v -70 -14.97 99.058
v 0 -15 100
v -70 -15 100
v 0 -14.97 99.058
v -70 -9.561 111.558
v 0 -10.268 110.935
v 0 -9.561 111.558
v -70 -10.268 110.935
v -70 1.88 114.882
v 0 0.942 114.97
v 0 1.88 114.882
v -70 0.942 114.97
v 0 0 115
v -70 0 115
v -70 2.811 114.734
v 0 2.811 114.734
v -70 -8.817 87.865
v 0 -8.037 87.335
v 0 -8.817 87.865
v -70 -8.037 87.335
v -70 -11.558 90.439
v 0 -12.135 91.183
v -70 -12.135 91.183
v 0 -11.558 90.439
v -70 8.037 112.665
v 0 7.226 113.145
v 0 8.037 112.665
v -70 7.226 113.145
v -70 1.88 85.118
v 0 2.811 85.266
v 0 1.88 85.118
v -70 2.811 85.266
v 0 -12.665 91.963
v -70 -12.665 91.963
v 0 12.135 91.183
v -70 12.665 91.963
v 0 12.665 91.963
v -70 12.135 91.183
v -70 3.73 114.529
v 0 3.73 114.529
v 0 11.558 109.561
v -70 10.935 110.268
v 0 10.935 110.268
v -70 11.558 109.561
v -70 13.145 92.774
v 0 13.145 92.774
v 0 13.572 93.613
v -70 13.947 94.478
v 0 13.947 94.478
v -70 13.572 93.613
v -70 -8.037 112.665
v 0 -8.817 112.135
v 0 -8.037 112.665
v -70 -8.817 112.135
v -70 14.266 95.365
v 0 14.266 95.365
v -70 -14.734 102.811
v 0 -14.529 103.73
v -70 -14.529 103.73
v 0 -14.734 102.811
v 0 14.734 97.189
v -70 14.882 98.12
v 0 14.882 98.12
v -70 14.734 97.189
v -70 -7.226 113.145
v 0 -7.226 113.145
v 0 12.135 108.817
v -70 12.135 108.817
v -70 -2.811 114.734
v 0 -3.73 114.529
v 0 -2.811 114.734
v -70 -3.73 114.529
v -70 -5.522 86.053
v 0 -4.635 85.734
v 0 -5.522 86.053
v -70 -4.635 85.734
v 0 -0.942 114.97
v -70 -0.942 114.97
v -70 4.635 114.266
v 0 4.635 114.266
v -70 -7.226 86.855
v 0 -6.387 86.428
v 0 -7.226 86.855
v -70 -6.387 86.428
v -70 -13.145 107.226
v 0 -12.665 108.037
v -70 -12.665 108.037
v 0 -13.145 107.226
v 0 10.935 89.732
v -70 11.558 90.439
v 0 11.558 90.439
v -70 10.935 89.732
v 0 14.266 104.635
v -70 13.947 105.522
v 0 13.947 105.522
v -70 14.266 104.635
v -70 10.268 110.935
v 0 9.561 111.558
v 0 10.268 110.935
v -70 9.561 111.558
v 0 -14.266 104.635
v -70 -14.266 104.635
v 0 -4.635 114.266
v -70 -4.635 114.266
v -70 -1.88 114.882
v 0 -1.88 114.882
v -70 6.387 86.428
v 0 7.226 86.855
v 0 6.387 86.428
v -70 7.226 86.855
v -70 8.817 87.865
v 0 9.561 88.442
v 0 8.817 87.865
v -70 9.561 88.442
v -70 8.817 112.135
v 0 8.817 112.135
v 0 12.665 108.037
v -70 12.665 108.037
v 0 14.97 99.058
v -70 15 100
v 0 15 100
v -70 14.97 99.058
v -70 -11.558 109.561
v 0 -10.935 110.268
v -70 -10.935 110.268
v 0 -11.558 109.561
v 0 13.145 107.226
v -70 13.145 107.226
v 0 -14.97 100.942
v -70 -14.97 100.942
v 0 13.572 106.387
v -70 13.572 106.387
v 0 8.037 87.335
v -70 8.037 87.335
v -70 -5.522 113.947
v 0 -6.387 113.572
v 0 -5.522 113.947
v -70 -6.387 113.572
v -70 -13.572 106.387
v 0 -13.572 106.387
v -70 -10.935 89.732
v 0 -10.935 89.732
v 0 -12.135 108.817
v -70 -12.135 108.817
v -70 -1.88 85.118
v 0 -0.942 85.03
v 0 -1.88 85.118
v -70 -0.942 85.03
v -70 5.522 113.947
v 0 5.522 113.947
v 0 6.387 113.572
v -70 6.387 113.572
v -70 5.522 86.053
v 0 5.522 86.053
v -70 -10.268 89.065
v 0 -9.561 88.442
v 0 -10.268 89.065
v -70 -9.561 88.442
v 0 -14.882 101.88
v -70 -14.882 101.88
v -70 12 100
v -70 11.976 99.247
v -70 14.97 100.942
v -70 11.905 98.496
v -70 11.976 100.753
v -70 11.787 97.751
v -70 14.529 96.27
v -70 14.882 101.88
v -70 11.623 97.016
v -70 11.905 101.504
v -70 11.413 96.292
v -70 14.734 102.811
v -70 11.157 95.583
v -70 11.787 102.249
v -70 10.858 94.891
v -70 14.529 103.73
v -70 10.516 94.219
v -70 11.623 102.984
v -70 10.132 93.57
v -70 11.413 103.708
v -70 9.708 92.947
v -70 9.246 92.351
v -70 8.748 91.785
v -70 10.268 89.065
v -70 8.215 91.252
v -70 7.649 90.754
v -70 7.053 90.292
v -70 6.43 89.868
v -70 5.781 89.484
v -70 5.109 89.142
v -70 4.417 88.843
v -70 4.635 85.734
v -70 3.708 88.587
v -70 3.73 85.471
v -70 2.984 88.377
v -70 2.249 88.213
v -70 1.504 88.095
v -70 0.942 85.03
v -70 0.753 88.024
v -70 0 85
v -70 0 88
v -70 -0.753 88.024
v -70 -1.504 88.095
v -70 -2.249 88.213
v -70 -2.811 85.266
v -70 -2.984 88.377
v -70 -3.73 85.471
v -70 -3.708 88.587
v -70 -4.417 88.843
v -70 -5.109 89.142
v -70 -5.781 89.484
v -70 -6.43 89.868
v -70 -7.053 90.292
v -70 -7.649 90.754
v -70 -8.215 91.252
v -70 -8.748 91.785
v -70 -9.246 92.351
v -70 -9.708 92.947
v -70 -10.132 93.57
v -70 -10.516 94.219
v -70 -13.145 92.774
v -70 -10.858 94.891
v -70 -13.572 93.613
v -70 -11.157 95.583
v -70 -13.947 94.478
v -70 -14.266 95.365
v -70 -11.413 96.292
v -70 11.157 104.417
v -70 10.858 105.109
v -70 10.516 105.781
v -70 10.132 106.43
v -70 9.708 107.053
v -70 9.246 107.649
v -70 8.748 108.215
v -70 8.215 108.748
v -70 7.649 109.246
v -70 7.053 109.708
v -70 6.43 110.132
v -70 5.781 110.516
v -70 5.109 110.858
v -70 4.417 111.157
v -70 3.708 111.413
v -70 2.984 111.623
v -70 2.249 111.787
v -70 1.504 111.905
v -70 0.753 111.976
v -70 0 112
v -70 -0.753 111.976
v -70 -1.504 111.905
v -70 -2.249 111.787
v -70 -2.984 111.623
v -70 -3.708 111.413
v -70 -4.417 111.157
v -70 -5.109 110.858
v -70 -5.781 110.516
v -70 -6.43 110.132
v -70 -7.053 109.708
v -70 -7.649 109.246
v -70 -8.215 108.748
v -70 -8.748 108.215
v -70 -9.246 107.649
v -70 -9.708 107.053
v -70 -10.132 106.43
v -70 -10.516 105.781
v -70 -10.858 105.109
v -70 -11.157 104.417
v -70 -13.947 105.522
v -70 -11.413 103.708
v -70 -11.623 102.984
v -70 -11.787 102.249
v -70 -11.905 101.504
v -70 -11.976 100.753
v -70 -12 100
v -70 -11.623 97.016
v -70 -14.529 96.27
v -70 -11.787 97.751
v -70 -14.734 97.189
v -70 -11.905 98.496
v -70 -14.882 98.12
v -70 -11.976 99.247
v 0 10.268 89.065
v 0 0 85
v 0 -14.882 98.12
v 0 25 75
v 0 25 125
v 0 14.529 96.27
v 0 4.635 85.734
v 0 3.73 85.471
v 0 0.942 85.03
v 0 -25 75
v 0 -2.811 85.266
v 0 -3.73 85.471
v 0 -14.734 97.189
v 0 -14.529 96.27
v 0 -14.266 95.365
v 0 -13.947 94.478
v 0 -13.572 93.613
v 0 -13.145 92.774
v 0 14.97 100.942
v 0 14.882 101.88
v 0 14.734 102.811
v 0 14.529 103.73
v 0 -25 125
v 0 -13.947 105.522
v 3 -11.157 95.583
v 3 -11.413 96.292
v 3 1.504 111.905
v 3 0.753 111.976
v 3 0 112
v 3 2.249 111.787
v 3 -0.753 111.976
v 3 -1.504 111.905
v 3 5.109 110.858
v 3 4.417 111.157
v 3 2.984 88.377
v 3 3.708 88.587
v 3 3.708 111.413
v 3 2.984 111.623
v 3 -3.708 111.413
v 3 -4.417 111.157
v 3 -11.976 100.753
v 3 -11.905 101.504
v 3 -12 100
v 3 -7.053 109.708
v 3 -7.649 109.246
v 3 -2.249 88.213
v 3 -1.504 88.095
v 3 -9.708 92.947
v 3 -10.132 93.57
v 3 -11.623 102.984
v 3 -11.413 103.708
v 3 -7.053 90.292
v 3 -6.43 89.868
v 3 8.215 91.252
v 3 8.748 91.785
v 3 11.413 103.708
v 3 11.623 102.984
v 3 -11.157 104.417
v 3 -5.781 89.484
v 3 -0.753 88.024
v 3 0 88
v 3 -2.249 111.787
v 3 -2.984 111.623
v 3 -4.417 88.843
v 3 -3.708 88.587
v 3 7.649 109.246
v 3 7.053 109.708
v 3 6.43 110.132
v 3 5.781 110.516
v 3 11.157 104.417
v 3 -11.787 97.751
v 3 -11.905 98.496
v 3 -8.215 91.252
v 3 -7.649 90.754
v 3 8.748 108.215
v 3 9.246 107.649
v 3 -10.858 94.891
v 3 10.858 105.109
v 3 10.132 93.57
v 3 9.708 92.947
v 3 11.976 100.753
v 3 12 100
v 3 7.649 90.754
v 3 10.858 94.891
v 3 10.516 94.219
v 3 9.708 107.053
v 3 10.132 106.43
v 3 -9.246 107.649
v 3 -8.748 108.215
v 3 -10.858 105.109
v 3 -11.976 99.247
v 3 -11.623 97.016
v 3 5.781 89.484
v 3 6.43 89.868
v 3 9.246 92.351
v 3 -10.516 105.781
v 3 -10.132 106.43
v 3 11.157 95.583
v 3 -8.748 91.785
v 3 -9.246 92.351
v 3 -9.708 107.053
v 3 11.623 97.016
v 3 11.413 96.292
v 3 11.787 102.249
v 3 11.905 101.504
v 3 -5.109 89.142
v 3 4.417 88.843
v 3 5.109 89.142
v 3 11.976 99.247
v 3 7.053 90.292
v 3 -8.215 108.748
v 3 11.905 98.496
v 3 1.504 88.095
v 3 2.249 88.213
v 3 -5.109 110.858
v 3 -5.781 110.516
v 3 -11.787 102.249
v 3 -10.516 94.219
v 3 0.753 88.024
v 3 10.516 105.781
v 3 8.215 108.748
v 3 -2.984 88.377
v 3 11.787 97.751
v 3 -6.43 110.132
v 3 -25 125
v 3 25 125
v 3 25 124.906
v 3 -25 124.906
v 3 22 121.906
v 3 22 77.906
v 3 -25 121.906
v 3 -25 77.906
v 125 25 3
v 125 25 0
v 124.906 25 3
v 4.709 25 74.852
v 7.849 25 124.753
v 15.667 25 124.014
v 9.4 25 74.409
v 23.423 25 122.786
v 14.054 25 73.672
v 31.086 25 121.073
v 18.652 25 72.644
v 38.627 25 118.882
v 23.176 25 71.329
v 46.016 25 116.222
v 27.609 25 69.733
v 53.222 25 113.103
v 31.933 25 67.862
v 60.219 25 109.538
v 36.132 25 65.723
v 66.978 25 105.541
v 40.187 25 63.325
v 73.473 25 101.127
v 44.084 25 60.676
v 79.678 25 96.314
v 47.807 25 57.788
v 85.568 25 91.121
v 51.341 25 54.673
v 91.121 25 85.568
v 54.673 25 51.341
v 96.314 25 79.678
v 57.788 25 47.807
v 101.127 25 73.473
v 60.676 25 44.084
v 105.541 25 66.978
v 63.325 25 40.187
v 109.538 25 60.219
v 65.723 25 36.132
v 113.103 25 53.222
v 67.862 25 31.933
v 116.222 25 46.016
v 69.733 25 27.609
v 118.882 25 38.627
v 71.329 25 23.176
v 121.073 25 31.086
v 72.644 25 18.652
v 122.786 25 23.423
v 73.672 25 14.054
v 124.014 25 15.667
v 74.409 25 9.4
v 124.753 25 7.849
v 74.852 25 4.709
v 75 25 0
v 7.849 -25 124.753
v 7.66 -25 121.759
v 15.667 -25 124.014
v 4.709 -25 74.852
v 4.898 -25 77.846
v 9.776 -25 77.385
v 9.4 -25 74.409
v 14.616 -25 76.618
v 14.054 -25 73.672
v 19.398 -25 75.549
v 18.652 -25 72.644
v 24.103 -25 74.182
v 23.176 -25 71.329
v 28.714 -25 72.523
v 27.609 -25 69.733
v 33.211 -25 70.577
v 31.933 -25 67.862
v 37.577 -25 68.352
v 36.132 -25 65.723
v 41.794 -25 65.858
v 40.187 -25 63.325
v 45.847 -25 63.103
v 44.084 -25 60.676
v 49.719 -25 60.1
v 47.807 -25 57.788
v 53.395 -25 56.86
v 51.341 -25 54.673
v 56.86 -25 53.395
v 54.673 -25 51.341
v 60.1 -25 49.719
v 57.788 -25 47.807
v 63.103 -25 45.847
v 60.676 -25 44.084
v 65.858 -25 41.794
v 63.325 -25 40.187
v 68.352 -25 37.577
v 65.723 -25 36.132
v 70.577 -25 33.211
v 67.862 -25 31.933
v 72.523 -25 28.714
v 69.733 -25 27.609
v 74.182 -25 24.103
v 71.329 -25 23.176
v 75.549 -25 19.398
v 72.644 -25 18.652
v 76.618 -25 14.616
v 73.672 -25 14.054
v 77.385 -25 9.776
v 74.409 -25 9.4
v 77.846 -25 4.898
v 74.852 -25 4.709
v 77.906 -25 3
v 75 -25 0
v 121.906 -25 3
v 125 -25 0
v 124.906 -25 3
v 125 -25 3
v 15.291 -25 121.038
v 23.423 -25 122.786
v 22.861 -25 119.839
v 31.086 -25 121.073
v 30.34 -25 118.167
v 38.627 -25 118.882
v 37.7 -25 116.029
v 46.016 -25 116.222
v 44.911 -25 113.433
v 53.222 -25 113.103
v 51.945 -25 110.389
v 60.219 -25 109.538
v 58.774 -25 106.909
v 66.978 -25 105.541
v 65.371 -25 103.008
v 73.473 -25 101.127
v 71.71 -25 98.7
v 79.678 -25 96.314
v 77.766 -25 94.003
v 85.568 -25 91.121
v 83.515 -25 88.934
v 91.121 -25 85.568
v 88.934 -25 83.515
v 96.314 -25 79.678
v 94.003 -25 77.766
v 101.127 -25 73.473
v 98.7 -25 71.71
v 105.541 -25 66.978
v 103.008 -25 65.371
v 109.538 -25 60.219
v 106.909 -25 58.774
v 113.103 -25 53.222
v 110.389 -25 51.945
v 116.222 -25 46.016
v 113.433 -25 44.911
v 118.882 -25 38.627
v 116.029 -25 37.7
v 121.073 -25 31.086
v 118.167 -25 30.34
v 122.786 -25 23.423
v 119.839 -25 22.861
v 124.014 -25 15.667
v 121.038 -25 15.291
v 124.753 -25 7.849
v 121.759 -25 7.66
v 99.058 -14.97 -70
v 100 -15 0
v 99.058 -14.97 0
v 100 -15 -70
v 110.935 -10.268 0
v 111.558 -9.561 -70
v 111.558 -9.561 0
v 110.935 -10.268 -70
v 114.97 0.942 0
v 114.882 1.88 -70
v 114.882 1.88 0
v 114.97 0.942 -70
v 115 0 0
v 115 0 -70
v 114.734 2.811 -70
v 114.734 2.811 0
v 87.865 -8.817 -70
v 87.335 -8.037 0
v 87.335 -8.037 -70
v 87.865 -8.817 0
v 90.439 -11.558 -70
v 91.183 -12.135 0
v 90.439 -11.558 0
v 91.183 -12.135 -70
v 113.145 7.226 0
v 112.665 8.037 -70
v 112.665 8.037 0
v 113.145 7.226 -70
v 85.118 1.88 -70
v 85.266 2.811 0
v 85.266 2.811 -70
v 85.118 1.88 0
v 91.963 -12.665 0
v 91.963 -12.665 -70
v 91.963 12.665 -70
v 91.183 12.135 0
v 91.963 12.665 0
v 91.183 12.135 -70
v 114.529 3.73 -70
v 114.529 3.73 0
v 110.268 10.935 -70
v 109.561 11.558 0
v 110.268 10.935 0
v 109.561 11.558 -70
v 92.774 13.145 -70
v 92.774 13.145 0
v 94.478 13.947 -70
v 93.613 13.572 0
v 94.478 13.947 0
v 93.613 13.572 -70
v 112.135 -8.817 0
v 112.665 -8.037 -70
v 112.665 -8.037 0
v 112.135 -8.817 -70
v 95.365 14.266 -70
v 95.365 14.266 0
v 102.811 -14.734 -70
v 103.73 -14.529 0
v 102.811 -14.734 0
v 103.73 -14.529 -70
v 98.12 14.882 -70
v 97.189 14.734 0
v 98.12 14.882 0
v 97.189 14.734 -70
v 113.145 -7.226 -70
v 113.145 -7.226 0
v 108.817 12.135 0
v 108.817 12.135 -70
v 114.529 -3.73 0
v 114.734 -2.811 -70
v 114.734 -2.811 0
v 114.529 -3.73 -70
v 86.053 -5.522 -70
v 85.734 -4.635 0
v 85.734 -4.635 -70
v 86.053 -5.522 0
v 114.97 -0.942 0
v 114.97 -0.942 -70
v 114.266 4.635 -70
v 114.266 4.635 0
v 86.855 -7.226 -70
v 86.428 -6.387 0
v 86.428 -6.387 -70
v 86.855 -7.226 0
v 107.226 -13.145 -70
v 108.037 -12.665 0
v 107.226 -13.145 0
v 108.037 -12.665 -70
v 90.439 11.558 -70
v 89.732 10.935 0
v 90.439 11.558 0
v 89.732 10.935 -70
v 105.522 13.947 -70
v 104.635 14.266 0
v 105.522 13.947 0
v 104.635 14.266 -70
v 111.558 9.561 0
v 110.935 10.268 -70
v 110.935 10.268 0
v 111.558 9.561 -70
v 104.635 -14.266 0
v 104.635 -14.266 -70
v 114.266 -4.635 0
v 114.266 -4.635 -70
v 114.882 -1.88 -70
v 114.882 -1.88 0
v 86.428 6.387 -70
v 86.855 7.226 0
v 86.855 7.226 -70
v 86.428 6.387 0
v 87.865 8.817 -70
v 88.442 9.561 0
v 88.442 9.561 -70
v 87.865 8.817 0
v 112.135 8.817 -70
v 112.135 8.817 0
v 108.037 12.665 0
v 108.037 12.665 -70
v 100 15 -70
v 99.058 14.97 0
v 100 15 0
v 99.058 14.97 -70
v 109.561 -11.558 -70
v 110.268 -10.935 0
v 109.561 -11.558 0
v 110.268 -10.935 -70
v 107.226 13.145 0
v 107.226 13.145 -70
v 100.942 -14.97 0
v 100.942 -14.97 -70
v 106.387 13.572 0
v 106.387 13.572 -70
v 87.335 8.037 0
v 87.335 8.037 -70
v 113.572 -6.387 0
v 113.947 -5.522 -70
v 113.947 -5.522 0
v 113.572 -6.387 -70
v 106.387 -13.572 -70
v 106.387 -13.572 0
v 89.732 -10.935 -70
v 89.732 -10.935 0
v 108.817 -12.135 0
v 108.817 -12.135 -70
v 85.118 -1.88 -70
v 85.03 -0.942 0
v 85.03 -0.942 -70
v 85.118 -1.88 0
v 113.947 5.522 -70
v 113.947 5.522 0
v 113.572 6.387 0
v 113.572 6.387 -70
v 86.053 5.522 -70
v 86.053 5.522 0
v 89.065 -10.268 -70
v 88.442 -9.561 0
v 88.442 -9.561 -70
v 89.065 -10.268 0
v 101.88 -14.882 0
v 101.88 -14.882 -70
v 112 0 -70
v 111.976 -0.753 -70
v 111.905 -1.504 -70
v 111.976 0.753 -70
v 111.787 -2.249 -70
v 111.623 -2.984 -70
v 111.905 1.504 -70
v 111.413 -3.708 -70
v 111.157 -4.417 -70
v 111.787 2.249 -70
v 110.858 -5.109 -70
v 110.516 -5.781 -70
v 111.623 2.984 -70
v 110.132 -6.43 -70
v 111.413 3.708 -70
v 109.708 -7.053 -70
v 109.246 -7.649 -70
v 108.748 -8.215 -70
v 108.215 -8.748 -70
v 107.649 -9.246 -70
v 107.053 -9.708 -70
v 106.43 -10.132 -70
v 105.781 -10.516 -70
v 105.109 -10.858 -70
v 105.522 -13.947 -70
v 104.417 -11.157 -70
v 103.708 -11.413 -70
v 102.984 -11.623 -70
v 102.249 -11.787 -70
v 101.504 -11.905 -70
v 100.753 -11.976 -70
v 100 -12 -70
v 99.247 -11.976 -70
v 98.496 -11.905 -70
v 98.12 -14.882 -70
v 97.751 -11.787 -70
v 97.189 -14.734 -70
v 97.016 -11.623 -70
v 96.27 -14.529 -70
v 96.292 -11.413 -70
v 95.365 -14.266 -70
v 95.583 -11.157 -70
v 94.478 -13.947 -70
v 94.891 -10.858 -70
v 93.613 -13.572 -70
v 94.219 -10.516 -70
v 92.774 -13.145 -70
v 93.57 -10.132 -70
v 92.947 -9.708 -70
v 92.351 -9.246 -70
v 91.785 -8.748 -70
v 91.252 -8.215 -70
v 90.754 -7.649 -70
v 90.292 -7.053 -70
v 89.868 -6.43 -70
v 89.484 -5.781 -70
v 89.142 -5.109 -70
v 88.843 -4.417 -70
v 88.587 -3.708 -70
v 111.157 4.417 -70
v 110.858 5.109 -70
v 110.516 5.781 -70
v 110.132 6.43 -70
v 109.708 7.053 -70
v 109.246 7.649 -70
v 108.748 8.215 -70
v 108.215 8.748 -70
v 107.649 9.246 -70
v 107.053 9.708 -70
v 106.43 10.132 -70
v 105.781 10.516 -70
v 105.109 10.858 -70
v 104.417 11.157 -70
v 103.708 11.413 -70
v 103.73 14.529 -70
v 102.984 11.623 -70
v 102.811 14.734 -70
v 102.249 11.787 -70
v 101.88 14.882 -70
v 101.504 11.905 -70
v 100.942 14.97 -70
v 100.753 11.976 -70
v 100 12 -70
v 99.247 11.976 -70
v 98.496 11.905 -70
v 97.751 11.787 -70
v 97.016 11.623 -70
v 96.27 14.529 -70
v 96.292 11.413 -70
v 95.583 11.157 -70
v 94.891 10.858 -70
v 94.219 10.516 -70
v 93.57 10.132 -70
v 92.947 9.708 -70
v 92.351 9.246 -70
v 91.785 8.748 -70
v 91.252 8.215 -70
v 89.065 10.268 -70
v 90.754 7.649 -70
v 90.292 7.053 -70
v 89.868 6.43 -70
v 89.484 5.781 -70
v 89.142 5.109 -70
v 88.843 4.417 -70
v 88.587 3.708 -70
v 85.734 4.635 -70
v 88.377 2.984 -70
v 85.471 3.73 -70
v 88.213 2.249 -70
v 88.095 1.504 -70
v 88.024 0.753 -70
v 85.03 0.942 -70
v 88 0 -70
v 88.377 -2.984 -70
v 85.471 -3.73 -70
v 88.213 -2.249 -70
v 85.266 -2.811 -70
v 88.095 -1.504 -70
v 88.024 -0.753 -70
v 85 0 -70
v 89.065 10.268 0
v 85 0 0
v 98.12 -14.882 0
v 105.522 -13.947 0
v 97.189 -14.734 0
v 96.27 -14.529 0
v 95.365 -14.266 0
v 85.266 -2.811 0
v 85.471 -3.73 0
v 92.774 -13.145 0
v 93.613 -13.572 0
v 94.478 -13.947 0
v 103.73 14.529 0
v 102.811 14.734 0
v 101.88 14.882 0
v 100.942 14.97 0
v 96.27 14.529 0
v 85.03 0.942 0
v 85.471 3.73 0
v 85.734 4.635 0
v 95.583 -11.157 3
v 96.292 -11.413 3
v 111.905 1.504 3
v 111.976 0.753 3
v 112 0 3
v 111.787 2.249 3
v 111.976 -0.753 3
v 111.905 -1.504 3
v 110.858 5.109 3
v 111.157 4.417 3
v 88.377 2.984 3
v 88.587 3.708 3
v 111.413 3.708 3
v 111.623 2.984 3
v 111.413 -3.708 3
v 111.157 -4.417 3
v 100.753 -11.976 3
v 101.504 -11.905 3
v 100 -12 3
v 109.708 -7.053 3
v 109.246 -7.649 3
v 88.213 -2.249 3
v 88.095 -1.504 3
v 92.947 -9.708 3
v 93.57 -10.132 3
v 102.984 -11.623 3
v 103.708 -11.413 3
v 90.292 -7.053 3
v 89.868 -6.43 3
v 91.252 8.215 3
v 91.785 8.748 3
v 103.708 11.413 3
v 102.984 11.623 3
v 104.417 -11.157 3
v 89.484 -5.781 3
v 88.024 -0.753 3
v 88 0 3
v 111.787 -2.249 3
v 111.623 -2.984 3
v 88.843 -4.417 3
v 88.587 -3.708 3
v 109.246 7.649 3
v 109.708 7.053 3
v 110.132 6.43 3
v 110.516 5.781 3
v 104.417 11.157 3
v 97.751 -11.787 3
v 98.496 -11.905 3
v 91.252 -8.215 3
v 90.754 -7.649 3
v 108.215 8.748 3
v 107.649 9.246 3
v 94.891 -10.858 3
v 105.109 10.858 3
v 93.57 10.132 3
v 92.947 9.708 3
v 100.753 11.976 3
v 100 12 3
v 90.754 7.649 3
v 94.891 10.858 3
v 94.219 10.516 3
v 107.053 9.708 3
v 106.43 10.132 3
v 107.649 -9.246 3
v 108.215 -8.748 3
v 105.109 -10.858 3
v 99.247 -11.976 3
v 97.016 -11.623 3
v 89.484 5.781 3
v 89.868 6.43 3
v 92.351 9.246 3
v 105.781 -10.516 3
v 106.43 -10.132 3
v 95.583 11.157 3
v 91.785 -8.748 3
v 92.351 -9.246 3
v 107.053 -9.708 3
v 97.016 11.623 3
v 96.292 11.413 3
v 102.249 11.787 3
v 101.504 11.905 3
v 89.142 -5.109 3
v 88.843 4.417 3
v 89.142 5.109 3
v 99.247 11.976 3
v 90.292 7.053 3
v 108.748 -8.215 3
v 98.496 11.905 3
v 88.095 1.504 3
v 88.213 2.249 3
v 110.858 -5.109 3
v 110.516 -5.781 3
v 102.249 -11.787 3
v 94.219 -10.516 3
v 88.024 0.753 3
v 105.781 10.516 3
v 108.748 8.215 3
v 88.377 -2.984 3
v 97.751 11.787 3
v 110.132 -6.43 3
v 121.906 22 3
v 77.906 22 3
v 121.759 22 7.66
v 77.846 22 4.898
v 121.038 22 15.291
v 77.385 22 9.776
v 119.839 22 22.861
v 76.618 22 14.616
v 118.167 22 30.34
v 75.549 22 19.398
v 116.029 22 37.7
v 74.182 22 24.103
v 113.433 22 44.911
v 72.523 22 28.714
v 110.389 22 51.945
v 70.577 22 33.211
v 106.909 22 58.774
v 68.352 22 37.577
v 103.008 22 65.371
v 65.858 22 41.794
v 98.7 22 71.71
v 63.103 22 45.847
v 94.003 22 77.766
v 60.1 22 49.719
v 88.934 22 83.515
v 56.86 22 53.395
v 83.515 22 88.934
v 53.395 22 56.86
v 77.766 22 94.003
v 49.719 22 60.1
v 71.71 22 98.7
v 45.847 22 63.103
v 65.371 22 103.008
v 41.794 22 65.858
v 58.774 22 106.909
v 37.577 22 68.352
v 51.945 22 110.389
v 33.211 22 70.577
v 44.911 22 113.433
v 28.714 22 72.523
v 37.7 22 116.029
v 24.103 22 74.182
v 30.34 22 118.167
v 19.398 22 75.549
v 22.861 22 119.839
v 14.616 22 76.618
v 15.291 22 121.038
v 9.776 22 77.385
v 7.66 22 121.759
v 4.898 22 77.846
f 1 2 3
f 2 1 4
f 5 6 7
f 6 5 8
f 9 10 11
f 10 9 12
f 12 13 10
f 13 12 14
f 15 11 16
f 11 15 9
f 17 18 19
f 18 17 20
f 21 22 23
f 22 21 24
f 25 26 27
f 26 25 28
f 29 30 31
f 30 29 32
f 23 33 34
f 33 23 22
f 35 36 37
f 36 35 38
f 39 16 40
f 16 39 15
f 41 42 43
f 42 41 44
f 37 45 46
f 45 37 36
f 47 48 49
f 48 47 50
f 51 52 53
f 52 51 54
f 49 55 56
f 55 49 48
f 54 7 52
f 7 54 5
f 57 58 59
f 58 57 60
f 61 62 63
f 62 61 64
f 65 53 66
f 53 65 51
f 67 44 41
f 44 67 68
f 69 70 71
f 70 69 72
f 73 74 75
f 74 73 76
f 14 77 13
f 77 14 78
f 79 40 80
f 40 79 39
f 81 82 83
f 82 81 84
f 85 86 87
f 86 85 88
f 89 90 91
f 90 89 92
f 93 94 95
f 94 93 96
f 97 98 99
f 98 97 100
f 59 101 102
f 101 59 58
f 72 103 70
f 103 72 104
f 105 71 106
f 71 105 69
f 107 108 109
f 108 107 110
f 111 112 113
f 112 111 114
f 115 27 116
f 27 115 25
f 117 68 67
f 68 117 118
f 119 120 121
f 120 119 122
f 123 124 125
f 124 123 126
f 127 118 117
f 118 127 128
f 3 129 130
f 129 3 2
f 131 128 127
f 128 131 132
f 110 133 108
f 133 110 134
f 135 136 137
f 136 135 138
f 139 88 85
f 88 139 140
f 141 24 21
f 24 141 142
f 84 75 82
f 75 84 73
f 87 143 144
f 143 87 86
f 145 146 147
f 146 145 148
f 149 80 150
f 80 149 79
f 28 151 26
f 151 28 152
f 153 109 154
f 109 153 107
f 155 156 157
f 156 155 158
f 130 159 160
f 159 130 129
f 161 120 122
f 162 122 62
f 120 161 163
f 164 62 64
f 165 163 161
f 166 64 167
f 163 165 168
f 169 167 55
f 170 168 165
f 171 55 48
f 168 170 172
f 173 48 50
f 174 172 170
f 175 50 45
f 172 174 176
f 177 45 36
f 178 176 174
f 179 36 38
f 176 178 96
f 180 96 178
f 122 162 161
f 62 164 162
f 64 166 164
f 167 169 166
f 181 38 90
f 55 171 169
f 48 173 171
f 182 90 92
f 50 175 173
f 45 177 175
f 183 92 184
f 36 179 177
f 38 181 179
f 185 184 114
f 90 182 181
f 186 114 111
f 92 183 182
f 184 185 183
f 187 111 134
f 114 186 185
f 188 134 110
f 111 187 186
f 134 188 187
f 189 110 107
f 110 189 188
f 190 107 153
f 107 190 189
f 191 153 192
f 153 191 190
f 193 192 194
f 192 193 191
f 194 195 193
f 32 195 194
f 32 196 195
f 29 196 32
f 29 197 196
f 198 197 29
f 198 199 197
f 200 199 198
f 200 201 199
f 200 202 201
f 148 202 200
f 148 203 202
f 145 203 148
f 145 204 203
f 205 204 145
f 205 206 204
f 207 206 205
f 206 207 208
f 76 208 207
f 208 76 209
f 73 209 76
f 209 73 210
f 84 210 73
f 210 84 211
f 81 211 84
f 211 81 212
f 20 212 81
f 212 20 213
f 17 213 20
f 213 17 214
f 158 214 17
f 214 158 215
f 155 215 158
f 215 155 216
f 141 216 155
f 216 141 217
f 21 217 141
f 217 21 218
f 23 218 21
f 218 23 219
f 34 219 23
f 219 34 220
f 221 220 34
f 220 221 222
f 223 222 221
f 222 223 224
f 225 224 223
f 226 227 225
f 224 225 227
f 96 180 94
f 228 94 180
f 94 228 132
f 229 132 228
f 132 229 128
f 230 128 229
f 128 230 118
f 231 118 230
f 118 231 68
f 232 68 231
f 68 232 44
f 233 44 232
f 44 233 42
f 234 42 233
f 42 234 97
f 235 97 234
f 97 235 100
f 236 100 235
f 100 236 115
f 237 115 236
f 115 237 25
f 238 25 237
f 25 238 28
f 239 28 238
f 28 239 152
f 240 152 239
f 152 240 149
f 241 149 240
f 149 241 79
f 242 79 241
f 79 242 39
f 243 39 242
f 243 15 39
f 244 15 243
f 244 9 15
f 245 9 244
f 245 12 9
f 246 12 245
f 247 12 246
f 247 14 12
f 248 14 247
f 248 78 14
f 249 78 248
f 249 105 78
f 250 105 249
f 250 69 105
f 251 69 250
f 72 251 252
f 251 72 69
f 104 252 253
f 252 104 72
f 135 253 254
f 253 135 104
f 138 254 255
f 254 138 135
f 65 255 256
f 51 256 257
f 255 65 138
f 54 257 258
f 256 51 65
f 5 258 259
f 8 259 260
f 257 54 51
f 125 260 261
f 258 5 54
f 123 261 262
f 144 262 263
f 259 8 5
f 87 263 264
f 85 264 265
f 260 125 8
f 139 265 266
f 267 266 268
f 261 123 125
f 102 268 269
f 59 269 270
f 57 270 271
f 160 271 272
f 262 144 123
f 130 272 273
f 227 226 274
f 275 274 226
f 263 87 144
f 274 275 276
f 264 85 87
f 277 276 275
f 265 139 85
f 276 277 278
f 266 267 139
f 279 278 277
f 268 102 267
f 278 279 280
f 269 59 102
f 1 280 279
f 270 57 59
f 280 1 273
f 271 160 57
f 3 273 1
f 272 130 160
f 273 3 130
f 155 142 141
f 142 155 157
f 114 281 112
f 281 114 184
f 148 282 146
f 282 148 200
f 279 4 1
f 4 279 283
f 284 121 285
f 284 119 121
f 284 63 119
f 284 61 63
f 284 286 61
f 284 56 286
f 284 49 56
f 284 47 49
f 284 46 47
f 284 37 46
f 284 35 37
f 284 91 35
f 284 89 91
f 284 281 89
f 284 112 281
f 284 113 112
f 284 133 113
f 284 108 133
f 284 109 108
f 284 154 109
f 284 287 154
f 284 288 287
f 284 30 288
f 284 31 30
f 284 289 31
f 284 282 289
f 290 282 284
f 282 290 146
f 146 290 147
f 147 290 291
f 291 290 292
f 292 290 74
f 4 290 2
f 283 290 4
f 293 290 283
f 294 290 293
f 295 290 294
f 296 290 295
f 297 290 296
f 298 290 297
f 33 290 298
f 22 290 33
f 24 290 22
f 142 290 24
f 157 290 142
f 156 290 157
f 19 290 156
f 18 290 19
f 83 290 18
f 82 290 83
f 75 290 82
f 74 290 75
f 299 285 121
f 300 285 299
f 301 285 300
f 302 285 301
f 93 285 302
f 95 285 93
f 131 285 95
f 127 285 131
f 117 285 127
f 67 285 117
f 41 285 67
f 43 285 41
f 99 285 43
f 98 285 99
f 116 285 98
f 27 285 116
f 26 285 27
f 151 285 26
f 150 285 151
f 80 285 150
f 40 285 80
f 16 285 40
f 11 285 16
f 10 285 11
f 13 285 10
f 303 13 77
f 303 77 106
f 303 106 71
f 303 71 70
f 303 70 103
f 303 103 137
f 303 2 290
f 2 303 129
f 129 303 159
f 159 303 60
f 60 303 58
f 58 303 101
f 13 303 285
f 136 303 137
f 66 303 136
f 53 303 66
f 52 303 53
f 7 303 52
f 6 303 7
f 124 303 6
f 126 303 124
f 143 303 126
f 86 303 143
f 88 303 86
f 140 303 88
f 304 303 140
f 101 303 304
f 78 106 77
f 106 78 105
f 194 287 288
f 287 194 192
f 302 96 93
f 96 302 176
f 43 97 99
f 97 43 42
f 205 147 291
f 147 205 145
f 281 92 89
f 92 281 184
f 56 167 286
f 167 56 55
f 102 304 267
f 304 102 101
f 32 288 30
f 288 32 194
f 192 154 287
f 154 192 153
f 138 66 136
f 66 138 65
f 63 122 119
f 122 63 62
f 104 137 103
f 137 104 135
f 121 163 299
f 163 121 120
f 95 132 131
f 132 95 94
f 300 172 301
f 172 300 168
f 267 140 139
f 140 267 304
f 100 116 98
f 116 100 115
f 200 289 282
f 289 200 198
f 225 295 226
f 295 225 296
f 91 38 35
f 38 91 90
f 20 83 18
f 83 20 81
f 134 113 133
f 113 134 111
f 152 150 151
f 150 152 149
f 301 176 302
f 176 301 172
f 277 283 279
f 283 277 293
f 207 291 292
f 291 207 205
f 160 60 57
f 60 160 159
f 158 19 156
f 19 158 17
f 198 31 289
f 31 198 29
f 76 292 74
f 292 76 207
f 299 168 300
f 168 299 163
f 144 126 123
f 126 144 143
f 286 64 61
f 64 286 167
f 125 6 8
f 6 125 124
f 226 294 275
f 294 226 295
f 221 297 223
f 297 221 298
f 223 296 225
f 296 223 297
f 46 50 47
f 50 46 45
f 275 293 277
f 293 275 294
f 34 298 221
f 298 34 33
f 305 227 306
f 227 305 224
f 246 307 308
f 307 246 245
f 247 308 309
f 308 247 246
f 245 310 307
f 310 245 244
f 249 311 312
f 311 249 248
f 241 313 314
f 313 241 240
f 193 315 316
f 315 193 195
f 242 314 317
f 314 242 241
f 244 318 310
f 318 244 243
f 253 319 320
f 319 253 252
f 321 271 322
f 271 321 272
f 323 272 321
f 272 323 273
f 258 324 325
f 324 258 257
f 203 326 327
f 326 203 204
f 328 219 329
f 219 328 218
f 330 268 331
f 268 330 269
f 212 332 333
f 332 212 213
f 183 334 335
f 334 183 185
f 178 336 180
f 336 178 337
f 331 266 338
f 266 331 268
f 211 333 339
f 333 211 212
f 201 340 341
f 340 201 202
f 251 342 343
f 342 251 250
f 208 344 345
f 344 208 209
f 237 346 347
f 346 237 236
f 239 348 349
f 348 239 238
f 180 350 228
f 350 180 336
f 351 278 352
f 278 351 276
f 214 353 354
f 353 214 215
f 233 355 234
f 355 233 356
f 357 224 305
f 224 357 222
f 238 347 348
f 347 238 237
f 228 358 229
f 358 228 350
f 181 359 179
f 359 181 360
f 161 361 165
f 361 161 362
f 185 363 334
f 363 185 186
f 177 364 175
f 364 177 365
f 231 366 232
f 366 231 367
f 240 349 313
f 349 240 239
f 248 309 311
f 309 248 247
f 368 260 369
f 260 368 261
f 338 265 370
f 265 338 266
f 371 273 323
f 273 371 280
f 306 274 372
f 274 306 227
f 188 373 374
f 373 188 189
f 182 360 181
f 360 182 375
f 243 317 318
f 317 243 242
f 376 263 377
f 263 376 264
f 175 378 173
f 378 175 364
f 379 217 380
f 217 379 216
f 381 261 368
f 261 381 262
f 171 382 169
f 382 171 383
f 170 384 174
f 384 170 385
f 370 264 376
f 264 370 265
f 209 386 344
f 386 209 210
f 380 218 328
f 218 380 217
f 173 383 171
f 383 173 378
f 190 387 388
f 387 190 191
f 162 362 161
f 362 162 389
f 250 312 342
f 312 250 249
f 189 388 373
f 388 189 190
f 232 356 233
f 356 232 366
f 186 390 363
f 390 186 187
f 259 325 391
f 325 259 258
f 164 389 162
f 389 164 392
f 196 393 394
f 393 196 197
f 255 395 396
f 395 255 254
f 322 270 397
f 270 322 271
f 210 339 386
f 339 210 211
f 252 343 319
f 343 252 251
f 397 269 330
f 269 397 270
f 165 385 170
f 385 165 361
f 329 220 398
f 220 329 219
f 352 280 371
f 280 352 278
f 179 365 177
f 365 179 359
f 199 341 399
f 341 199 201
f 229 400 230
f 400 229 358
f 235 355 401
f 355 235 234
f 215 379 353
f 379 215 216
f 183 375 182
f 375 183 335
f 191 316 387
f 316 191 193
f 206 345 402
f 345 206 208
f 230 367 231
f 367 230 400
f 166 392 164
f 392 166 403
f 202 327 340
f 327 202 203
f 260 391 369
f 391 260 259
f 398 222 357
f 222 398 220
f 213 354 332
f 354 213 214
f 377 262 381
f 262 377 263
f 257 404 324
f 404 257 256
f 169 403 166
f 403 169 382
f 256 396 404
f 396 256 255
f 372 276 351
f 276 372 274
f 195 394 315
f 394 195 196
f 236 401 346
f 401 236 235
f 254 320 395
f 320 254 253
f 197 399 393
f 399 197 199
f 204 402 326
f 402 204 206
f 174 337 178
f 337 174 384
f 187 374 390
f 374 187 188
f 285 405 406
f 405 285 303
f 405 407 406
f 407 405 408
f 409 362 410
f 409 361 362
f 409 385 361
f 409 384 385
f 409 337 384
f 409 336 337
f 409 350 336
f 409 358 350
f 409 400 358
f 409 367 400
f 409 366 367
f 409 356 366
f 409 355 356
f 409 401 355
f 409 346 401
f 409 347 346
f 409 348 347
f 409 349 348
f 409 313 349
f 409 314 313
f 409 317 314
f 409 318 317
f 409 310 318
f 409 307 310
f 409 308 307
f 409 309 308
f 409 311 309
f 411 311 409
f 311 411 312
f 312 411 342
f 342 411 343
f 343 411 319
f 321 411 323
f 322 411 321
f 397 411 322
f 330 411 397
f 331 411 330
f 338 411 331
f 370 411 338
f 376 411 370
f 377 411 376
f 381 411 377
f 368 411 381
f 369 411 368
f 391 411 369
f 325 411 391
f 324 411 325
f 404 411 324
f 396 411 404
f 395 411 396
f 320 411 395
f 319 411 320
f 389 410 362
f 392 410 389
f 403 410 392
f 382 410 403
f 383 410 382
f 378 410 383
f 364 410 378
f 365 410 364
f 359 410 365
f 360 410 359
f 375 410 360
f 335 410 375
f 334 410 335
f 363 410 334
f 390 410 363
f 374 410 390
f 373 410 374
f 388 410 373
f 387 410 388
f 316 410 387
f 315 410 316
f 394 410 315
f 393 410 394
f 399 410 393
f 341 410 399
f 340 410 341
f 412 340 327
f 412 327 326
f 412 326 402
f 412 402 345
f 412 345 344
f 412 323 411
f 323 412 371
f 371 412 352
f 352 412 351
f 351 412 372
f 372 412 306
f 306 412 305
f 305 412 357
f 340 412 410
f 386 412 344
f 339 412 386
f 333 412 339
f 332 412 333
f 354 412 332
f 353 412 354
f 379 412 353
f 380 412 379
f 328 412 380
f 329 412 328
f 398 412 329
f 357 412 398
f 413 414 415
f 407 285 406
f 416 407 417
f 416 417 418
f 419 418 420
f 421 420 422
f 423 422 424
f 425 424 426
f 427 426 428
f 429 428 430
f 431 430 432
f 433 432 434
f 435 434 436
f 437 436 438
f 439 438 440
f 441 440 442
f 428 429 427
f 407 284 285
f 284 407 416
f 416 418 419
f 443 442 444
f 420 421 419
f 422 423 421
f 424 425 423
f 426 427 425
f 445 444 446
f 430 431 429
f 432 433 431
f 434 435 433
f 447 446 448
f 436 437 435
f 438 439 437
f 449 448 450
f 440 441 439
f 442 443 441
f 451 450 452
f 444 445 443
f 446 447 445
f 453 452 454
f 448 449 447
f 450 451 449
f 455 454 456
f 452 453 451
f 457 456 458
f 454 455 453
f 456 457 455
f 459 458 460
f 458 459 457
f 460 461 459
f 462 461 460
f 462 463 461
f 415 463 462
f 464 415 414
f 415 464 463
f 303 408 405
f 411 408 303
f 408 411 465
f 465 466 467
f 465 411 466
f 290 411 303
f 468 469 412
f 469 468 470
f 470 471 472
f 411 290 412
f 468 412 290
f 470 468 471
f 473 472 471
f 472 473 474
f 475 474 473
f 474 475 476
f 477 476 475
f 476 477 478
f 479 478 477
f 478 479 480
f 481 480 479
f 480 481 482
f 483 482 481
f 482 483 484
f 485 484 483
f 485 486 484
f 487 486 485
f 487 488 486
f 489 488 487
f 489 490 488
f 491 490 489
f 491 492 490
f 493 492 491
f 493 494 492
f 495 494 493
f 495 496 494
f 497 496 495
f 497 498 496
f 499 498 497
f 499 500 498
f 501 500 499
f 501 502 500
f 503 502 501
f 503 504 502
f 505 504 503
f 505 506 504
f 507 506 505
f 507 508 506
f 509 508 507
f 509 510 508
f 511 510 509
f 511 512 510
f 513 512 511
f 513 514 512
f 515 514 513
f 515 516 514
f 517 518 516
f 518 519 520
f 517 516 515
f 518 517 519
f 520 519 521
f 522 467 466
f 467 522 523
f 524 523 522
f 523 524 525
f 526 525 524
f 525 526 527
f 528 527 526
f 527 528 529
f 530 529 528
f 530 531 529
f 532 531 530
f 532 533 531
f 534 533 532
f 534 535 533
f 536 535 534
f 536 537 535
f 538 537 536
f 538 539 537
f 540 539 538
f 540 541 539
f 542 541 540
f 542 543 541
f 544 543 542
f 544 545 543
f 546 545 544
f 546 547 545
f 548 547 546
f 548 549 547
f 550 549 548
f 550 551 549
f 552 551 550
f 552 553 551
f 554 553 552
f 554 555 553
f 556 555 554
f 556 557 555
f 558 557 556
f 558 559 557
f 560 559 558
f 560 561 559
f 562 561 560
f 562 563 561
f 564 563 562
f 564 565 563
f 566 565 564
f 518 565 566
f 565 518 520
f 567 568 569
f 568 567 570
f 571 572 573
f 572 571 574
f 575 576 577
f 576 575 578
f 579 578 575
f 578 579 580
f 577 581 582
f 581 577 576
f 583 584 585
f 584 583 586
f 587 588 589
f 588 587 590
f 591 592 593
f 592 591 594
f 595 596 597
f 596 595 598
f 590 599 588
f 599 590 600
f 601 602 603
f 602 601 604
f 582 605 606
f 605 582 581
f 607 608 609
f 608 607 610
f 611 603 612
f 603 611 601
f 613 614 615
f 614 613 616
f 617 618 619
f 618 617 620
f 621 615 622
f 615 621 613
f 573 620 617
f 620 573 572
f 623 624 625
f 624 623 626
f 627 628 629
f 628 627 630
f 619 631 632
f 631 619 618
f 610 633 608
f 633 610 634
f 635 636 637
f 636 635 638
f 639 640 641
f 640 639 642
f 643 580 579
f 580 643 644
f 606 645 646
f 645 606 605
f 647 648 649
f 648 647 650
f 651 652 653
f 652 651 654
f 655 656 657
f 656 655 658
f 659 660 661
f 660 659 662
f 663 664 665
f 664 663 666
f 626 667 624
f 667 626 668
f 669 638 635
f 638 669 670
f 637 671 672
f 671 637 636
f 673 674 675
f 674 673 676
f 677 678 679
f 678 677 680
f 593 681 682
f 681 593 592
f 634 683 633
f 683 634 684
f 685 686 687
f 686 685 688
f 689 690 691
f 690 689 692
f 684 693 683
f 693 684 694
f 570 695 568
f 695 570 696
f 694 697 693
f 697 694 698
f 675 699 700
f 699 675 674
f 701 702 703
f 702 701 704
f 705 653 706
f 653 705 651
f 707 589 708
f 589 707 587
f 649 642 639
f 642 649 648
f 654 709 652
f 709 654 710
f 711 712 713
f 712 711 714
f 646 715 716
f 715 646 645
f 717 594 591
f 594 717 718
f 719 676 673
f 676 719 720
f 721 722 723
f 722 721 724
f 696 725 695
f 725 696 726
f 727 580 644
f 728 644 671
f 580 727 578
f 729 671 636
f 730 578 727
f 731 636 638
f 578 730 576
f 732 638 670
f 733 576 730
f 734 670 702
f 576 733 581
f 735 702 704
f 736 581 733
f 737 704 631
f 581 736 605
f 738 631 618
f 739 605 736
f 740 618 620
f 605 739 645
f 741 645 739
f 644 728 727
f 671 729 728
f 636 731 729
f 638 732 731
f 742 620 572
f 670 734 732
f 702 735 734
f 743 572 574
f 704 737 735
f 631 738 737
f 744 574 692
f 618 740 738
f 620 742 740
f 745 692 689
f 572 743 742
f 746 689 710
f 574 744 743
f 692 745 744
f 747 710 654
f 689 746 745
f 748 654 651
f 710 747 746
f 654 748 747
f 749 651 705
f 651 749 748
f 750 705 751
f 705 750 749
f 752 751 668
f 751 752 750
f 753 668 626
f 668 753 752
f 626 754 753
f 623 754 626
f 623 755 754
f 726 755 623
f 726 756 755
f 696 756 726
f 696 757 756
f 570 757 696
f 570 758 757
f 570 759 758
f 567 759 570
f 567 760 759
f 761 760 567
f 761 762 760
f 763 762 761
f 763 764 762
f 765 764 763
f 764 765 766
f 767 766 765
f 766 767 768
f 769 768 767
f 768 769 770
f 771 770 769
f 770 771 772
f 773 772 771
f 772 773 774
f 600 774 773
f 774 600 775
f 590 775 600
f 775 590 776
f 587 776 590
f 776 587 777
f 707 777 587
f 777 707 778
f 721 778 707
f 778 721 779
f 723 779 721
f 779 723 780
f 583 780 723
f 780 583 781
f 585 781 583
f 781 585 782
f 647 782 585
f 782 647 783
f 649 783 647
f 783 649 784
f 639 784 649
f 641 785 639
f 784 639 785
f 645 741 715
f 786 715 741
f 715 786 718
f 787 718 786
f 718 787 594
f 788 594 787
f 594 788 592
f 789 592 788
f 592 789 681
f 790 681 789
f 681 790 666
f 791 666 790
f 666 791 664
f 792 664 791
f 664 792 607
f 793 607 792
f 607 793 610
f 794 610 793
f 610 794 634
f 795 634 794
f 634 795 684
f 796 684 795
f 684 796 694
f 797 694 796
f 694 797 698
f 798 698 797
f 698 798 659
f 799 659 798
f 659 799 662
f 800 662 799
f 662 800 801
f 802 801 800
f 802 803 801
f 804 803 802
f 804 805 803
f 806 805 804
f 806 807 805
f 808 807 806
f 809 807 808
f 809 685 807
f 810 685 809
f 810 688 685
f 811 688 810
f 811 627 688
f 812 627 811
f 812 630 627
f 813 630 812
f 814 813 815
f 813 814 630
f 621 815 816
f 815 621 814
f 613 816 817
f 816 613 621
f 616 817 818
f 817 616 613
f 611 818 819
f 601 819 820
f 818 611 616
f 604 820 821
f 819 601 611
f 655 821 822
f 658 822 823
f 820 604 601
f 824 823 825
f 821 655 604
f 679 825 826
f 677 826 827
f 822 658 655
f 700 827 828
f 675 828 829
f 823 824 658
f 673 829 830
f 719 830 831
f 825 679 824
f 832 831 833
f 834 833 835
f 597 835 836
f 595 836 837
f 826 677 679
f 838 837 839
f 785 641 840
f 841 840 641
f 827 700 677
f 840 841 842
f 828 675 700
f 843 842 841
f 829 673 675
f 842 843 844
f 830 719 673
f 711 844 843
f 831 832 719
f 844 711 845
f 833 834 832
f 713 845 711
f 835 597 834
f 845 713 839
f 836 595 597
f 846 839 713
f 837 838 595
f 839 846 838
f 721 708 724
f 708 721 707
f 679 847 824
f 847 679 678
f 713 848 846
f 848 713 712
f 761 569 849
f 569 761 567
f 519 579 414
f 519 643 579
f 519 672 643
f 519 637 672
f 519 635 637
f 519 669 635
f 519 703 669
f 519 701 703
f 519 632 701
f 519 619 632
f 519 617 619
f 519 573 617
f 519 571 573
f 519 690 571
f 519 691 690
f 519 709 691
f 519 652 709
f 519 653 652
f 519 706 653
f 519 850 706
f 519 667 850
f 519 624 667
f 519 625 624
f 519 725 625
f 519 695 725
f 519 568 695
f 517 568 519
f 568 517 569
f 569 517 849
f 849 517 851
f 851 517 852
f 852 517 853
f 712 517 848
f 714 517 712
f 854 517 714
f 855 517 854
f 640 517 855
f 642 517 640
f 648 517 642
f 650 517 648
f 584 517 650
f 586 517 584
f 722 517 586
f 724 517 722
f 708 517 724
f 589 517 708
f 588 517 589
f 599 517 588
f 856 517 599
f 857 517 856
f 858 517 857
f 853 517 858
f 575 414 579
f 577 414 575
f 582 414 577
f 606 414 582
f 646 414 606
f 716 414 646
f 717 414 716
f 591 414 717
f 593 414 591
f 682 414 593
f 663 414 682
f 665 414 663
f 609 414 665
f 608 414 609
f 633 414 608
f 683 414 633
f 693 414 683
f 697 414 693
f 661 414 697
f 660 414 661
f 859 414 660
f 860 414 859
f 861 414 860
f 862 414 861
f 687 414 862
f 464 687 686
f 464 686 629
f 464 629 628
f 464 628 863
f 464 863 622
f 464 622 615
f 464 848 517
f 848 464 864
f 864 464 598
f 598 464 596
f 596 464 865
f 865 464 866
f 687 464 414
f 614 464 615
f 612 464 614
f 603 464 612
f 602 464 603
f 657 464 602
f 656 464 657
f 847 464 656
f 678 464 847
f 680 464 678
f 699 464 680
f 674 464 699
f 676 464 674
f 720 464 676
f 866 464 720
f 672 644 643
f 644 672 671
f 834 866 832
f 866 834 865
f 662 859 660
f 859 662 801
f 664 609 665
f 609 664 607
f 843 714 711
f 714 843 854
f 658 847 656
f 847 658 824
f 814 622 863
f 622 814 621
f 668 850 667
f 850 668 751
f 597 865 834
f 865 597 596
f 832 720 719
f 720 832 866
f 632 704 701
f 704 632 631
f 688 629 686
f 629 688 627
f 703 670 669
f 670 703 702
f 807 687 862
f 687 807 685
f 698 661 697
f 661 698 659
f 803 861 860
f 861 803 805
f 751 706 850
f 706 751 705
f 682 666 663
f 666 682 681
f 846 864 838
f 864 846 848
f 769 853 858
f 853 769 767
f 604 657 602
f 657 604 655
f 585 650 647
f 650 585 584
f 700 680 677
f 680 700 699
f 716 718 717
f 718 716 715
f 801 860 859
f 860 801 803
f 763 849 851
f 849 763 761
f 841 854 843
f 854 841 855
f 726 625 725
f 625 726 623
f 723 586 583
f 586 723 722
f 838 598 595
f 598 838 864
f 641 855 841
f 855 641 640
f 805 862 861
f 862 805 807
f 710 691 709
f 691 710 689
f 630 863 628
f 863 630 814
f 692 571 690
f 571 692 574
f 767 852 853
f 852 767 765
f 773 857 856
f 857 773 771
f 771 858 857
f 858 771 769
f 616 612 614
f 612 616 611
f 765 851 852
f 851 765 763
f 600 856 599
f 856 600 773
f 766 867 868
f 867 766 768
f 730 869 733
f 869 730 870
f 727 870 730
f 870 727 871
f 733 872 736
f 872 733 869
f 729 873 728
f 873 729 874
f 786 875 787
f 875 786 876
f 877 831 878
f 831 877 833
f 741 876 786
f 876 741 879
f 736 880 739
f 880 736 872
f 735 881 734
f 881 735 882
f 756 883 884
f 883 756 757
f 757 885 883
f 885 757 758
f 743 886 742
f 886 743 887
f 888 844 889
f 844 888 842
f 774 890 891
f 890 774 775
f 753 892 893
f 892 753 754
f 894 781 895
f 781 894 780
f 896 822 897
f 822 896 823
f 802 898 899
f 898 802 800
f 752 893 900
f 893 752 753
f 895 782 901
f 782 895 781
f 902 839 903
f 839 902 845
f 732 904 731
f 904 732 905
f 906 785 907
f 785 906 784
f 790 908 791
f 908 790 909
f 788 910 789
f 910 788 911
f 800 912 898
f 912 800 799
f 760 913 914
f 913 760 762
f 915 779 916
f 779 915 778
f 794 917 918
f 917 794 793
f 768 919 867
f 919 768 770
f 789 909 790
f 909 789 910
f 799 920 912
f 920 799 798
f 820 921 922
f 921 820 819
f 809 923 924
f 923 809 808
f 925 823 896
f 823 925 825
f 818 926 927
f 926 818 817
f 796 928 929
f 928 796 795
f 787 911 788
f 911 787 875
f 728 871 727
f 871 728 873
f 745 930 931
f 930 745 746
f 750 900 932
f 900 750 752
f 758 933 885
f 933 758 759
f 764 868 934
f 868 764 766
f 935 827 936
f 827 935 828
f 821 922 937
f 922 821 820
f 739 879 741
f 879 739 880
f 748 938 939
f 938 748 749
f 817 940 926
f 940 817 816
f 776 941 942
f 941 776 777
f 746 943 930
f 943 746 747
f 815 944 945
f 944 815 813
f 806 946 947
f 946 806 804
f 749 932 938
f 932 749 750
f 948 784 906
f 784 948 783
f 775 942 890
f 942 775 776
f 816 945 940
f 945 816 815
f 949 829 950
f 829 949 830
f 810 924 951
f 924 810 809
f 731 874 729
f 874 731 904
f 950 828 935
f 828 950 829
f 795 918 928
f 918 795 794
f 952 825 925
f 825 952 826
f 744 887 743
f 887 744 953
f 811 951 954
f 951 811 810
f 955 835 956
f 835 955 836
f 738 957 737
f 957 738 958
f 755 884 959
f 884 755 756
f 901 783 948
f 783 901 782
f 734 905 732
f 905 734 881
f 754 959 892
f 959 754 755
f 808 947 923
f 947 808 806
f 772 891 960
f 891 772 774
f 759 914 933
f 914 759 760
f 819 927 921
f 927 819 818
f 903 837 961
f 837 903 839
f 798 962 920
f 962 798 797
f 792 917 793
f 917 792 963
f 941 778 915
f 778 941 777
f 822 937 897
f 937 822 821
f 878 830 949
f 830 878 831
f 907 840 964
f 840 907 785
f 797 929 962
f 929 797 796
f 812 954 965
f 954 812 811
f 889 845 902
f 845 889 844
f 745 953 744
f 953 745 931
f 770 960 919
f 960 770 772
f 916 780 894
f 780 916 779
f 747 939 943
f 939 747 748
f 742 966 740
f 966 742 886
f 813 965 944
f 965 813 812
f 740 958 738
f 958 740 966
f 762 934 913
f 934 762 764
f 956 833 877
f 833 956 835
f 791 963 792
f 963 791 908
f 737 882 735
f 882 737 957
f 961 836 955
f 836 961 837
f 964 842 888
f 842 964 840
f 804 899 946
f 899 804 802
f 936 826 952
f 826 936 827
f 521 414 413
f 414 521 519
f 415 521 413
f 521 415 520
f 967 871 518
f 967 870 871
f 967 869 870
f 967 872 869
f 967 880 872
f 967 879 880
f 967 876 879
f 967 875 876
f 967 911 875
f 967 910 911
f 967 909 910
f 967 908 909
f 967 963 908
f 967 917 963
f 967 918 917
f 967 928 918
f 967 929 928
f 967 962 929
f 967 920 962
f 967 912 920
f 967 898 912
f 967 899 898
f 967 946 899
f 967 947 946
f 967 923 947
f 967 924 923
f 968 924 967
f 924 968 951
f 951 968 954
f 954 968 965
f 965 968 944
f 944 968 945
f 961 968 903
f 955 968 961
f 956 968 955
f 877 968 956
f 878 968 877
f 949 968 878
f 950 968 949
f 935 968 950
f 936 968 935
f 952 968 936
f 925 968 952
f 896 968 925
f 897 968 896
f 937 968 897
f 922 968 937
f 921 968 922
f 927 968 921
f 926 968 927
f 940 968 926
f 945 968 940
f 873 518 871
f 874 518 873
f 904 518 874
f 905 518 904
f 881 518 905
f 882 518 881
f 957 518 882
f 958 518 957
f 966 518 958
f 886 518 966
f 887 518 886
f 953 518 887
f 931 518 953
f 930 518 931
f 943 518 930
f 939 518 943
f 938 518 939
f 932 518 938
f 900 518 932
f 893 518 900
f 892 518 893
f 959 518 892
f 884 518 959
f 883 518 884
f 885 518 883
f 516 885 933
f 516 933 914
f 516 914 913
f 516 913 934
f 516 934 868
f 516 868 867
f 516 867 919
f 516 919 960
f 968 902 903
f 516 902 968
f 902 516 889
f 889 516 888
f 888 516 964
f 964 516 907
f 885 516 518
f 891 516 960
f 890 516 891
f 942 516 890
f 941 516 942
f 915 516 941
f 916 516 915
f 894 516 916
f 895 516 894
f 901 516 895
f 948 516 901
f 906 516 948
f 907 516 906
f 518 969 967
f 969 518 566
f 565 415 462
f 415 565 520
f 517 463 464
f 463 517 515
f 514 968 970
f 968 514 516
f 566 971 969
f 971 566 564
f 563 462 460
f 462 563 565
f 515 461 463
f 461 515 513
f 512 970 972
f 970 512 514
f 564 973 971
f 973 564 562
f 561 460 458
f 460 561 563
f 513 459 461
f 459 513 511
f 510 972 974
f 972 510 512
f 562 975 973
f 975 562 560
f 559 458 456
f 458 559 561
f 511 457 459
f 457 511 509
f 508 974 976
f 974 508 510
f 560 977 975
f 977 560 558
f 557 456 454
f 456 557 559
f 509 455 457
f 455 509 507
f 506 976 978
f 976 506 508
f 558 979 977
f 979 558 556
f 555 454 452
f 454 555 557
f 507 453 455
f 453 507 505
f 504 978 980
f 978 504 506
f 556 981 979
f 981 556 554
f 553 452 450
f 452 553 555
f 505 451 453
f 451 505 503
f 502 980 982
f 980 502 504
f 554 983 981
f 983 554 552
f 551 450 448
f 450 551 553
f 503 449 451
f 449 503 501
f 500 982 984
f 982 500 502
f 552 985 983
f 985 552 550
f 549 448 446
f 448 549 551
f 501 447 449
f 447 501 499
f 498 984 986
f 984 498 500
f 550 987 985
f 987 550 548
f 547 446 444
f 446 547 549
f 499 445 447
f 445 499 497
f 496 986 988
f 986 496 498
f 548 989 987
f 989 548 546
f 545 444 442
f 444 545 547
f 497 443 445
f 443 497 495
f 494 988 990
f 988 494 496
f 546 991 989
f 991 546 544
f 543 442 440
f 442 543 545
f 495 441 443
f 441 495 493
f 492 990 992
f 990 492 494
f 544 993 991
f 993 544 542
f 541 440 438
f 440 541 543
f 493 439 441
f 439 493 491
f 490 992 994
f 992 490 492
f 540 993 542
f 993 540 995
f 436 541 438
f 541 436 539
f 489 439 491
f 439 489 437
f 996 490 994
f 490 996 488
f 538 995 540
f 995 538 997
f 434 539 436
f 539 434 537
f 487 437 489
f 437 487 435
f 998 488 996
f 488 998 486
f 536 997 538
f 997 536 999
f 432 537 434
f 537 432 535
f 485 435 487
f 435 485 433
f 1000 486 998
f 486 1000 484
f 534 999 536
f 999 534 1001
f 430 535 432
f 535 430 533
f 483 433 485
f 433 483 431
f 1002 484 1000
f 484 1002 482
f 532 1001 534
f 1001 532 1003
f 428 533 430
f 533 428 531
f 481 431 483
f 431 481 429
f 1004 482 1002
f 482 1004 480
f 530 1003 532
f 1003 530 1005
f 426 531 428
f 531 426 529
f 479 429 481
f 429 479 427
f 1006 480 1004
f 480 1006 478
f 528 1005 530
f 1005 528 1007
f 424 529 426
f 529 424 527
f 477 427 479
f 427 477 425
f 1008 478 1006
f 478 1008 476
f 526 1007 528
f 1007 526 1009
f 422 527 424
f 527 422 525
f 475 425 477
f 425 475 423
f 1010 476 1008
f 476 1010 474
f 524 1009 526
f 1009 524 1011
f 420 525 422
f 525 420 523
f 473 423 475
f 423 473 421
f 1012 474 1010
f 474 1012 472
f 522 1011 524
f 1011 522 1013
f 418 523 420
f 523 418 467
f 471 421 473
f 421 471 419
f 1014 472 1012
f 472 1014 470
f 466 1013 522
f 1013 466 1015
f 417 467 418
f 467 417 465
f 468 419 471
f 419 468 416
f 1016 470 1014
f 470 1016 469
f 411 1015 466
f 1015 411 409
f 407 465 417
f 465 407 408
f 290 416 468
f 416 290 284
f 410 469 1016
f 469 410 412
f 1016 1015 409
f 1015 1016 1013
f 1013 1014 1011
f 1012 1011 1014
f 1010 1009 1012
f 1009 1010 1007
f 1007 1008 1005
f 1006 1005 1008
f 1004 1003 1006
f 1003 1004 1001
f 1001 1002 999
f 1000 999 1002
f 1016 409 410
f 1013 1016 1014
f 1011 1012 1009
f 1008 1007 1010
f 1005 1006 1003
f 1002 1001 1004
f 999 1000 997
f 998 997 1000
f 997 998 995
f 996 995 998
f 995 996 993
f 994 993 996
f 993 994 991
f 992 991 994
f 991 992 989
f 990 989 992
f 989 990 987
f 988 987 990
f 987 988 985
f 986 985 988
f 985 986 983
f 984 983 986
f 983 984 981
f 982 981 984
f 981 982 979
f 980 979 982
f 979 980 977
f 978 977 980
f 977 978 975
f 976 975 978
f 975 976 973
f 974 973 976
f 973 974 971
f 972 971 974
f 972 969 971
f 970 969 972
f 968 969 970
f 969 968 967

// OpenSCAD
$fn=100;
mm=1; // define units
degrees=1;

include <lib.scad>

module example_125(){
     curve_rad=100;
     hole_dia=24;
     wall_thickness=3;
     module pipe(){
	  annulus(od=30,id=hole_dia,h=70);
	  difference(){
	       Cube([50,50,-wall_thickness],center=X+Y);
	       wcylinder(d=hole_dia,h=-wall_thickness);}}
     module curved_box(){
	  // Assuming square crossesction.
	  rotate(-90*X){
	       rotate_extrude(angle=-90){
		    translate((curve_rad-25)*X){
			 difference(){
			      translate(-25*Y)
				   square([50,50]);
			      translate(wall_thickness*X-25*Y){
				   square([50-2*wall_thickness,50-wall_thickness]);}}}}}}
     curved_box();
     translate(curve_rad*Z){
	  rotate(-90*Y){
	       pipe();}}
     translate(curve_rad*X){
	  mirror(Z){
	       pipe();}}
}

example_125();
